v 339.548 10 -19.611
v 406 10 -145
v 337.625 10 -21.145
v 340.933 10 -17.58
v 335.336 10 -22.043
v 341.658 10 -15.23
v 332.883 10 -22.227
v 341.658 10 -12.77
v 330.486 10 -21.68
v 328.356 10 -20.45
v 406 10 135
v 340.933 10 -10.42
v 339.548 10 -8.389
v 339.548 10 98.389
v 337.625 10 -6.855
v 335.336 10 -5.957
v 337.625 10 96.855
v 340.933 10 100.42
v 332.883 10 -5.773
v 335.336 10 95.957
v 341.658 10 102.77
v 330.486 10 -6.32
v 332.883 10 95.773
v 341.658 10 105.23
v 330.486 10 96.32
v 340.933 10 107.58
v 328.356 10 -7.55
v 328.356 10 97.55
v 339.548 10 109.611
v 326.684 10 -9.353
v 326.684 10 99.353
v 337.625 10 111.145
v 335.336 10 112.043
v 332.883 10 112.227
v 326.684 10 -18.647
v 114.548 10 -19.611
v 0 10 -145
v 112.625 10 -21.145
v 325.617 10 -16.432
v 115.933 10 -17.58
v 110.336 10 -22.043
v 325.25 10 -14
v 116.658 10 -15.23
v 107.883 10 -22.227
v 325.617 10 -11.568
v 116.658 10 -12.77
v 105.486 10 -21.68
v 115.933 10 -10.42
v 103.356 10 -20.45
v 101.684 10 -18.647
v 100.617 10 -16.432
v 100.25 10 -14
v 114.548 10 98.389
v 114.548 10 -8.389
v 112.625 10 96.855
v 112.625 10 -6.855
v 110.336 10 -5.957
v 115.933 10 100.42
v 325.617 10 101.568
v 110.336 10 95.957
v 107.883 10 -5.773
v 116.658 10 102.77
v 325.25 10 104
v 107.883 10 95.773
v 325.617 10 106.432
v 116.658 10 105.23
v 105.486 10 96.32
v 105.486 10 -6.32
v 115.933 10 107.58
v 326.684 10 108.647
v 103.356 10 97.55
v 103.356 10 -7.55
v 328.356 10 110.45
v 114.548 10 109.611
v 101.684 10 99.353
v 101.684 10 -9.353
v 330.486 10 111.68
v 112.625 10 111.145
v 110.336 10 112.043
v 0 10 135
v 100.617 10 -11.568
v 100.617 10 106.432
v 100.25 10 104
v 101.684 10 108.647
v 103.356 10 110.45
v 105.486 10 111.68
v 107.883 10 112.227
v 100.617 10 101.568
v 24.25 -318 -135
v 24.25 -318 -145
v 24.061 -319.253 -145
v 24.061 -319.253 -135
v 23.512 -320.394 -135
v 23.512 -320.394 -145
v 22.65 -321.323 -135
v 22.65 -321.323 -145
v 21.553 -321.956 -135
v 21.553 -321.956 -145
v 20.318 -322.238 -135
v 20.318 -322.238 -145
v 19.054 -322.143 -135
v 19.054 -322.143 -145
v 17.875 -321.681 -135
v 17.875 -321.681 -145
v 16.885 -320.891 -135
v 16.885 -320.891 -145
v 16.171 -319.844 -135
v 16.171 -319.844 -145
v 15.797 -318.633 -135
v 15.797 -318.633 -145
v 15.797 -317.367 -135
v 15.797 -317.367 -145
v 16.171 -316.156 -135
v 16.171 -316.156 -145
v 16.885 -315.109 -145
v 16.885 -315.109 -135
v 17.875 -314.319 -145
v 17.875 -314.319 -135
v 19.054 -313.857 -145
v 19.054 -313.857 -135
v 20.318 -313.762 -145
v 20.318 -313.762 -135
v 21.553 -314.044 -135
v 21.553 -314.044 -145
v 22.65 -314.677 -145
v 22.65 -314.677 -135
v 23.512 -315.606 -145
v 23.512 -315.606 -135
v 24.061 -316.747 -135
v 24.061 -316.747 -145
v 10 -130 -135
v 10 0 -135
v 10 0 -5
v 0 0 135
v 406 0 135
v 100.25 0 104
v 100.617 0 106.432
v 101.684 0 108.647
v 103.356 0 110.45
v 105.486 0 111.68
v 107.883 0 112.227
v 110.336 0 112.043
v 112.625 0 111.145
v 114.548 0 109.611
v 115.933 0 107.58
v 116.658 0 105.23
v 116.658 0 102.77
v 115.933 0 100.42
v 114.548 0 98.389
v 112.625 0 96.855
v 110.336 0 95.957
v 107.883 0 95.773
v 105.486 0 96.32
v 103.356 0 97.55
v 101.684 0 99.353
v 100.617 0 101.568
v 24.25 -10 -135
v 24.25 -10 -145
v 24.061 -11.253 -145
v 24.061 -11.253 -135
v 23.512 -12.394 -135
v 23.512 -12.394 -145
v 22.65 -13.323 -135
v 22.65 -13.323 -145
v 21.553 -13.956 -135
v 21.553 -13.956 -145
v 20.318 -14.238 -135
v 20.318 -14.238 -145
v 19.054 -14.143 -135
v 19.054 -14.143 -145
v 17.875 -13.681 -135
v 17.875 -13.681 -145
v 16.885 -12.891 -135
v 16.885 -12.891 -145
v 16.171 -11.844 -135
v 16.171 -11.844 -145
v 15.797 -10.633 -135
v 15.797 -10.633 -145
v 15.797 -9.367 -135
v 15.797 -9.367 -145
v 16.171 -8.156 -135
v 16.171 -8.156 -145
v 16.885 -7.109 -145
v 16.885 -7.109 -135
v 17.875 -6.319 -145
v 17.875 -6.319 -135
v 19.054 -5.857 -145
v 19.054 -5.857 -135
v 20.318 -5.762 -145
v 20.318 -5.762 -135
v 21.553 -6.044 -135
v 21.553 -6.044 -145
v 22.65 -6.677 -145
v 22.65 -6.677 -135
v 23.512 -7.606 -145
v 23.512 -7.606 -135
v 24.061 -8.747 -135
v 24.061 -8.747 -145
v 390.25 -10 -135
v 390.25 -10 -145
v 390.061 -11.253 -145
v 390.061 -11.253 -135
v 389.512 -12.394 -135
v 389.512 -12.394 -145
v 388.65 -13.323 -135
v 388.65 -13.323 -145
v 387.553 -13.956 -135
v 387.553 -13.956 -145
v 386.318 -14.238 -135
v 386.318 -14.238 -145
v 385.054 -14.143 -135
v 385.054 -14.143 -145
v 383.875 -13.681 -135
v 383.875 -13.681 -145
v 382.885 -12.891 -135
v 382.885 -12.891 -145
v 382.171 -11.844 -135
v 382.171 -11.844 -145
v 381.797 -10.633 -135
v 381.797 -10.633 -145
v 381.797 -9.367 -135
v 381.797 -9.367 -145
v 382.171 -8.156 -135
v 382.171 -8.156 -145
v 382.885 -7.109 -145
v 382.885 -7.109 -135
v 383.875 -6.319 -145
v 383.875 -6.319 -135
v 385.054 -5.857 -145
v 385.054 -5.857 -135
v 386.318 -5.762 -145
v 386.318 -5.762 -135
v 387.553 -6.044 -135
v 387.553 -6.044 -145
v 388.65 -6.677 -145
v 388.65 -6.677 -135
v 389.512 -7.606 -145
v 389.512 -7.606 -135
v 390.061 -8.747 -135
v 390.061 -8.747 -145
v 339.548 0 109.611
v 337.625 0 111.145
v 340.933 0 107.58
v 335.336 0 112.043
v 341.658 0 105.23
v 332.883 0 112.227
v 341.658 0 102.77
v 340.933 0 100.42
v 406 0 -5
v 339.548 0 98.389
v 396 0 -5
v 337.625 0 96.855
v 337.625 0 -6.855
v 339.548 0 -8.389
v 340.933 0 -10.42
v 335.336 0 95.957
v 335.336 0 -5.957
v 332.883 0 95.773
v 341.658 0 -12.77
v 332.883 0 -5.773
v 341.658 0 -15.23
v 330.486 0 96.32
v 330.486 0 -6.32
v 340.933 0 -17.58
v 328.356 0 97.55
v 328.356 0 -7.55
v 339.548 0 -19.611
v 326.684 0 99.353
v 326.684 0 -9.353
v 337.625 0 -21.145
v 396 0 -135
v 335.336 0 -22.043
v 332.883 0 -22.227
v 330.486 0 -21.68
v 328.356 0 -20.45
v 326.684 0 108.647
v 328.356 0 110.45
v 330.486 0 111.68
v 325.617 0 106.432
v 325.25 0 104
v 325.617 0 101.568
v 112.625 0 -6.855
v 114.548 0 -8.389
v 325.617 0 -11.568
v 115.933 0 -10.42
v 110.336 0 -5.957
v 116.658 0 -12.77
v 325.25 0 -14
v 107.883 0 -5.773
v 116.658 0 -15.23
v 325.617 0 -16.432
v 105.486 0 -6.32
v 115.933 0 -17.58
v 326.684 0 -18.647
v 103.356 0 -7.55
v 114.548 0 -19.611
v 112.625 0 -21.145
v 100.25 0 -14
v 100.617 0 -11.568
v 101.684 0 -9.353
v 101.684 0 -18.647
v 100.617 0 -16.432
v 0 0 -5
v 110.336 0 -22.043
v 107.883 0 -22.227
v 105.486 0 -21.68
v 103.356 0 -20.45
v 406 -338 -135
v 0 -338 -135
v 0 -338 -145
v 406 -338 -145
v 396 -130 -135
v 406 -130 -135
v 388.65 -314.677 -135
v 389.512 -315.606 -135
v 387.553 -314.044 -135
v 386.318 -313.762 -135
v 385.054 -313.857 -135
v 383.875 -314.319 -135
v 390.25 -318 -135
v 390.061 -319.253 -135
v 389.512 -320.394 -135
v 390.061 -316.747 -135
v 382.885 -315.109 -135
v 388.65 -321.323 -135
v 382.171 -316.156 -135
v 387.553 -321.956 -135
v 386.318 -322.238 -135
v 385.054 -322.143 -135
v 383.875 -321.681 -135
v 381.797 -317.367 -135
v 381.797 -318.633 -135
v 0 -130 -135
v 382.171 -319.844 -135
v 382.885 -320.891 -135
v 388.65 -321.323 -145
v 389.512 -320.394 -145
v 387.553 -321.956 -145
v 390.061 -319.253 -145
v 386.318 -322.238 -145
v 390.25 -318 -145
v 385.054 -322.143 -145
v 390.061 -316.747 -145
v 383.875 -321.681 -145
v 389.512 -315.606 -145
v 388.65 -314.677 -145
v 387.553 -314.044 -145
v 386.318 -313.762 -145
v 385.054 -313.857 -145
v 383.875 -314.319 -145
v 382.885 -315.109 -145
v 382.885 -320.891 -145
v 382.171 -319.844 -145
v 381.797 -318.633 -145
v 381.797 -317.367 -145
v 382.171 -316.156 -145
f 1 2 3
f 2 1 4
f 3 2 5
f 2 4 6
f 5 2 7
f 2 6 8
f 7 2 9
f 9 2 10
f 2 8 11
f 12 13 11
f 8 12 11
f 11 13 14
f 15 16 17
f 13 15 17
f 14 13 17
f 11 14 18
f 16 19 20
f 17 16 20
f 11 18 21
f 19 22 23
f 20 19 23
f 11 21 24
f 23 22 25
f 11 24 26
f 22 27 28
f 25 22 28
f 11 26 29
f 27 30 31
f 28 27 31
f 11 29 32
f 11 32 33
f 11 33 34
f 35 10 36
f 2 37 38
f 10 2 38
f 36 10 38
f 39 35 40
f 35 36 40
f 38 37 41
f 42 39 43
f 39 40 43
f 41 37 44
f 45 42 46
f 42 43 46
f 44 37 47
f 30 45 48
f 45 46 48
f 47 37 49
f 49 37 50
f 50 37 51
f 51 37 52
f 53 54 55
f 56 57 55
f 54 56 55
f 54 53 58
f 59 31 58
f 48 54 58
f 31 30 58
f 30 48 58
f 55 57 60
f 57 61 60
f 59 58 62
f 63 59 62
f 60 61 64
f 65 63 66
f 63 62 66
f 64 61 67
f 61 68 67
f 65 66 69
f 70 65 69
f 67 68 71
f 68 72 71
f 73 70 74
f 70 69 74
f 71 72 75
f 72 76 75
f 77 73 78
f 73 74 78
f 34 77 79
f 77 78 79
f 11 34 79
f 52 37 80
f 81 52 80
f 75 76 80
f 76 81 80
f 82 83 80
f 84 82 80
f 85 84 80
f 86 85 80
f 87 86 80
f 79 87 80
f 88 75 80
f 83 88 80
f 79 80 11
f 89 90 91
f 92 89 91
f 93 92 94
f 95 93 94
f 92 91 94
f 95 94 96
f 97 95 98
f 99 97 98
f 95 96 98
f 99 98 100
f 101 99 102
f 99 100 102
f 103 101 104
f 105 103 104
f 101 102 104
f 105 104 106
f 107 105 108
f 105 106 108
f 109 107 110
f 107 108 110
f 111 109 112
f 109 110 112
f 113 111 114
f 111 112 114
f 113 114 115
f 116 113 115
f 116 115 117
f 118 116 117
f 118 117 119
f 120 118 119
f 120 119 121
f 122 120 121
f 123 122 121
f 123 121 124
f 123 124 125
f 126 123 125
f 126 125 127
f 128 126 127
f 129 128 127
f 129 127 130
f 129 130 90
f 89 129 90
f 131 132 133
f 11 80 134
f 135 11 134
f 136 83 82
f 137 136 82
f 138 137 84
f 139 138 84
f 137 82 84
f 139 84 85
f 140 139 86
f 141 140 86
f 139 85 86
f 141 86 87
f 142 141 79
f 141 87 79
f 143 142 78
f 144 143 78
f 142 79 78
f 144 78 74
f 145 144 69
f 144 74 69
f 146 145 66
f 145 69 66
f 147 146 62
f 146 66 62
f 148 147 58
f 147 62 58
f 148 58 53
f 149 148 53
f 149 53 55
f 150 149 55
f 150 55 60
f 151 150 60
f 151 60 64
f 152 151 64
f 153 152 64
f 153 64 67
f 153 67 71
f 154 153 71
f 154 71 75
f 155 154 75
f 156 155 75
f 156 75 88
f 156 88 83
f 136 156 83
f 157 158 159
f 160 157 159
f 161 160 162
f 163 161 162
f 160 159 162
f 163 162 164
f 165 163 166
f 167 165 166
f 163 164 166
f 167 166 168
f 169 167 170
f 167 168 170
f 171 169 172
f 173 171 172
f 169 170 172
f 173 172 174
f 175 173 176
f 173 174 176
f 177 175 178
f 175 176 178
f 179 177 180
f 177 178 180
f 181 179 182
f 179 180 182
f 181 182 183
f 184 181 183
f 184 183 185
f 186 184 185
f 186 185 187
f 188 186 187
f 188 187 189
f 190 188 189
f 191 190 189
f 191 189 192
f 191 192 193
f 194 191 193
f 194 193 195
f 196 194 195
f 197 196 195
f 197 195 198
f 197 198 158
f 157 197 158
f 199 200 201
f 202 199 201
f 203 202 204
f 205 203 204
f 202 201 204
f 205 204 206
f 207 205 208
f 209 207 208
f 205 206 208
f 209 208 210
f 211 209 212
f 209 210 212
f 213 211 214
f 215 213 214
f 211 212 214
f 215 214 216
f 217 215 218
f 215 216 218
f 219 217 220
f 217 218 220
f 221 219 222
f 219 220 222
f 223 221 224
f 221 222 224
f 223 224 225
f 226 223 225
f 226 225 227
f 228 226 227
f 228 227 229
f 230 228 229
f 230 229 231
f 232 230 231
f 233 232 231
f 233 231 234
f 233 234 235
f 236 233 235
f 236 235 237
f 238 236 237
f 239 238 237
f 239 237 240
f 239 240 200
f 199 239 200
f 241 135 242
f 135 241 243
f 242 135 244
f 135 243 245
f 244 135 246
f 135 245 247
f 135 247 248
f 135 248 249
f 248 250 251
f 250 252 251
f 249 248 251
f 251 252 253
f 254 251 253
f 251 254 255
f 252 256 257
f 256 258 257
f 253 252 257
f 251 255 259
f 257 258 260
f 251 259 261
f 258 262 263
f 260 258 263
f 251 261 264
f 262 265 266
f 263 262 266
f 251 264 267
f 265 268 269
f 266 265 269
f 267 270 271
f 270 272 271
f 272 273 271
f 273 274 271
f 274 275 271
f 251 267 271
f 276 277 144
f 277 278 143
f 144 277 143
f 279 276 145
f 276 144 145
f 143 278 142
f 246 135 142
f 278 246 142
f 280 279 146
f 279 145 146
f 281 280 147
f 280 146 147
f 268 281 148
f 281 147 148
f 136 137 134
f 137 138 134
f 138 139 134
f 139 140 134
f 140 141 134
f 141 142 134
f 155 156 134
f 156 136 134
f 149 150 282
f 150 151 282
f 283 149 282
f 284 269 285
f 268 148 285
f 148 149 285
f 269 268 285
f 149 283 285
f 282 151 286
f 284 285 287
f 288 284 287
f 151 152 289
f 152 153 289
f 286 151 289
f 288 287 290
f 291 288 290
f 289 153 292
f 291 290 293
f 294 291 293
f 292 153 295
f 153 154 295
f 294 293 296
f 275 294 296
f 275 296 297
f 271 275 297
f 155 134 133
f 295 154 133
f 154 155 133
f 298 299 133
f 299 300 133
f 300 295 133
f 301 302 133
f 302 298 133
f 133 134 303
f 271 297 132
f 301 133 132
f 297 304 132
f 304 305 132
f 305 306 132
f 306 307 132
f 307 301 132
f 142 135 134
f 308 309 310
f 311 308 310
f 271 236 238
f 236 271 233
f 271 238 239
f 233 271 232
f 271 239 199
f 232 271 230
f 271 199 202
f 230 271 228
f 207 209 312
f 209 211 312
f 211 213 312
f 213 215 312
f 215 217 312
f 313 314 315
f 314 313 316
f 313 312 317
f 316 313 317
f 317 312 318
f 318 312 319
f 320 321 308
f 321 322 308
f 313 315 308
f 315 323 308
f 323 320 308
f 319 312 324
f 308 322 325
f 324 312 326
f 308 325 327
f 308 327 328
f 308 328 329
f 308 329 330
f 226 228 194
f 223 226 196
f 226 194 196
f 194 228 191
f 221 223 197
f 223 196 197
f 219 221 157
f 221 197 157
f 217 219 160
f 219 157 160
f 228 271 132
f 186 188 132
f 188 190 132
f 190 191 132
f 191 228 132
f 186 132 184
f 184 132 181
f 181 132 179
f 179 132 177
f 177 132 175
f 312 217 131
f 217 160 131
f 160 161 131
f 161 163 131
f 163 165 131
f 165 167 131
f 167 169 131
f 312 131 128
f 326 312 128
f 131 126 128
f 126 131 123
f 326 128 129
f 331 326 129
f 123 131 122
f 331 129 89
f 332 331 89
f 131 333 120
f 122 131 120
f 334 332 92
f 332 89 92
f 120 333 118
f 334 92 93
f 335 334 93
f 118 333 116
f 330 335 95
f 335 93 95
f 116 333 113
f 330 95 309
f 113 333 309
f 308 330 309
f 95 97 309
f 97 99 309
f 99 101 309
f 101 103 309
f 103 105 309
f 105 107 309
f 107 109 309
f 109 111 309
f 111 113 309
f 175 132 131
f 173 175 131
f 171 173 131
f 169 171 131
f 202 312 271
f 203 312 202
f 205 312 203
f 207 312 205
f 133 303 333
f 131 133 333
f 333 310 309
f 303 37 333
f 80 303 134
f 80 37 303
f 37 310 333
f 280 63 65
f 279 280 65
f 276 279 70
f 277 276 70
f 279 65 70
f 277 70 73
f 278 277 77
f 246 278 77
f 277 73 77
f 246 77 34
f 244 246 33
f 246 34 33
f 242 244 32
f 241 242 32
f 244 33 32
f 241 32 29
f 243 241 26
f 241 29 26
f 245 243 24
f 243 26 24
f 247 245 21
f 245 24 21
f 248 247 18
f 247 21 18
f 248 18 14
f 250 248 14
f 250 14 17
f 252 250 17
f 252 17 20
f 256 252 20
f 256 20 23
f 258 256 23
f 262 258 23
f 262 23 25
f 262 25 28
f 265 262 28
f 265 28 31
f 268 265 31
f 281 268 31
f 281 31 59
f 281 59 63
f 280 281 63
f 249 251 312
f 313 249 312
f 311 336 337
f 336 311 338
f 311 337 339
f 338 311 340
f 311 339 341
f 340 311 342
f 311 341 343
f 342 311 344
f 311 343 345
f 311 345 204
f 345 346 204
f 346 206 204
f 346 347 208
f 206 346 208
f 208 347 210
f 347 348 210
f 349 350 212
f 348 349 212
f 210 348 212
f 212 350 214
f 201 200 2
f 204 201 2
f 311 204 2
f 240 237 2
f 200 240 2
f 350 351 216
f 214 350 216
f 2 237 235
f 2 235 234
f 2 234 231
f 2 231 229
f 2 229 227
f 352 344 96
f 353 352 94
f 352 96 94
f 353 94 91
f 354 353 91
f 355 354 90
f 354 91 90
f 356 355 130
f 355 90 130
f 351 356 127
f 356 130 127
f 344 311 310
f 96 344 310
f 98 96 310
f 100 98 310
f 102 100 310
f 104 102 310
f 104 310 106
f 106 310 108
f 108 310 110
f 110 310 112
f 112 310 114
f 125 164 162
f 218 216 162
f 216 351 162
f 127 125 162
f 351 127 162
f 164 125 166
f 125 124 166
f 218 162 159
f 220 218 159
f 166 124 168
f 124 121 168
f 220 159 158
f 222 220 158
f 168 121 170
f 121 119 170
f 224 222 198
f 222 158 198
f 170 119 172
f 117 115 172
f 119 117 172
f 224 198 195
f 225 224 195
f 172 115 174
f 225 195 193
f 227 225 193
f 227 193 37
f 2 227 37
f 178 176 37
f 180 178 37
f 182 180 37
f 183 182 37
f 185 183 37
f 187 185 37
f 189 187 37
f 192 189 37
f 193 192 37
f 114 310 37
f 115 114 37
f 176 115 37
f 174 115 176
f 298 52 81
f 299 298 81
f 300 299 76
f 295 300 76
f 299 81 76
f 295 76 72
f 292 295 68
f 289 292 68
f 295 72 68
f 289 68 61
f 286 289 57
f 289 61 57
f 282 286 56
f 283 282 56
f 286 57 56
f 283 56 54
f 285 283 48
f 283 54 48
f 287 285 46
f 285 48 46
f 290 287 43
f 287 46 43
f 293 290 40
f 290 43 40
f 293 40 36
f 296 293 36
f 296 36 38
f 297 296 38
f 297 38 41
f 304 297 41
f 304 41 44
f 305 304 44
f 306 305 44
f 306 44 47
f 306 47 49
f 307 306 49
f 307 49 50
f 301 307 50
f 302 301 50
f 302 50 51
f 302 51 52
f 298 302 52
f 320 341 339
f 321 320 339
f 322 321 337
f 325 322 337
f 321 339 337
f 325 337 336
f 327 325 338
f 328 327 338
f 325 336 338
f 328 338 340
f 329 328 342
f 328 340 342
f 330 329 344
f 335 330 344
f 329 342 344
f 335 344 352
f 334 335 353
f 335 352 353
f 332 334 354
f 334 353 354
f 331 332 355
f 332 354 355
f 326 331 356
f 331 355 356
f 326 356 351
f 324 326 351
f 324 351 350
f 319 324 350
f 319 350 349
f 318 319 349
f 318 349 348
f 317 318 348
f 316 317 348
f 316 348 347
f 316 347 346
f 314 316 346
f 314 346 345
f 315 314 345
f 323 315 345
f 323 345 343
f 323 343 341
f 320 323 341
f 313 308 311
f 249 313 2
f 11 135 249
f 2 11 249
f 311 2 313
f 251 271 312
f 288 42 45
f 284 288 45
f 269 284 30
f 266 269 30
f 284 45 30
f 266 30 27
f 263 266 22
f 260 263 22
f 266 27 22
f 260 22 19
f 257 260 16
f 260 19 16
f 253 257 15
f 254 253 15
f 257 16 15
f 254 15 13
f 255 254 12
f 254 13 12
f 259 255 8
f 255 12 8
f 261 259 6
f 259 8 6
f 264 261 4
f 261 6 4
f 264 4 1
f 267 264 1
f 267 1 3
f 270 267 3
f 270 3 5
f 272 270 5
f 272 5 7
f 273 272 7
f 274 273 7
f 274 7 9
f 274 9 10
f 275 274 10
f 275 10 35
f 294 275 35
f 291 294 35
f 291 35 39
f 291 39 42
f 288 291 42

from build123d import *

# Parameters (mm, degrees)
F1_DEPTH  = 406
F2_W      = 10
F2_H      = 130
F3_DEPTH  = 130
F6_DEPTH  = 406.001
F7_R      = 8.25
F8_DEPTH  = 348.001
F9_R      = 4.25
F10_DEPTH = 280.001


with BuildPart() as f1:
    # F0 (on Right) → F1 (new body)
    with BuildSketch(Plane.YZ):
        Polygon((10, 135), (0, 135), (0, -135), (-338, -135), (-338, -145), (10, -145), align=None)
    extrude(amount=F1_DEPTH)

    # F2 (on face) → F3 (join)
    with BuildSketch(Plane.XZ):
        with Locations((5, -70)):
            Rectangle(F2_W, F2_H)
        with Locations((401, -70)):
            Rectangle(F2_W, F2_H)
    extrude(amount=F3_DEPTH)

    # F5 (on face) + F4 (on face) → F6 (cut, through all)
    with BuildSketch(Plane(origin=(0, 0, 0), x_dir=(0, -1, 0), z_dir=(-1, 0, 0))):
        Polygon((130, -5), (0, -5), (130, -135), align=None)
    with BuildSketch(Plane.YZ.offset(406)):
        Polygon((-130, -135), (0, -5), (-130, -5), align=None)
    extrude(amount=-F6_DEPTH, mode=Mode.SUBTRACT)

    # F7 (on face) → F8 (cut, through all)
    with BuildSketch(Plane(origin=(0, 10, 0), x_dir=(-1, 0, 0), z_dir=(0, 1, 0))):
        with Locations((-333.5, 104)):
            Circle(F7_R)
        with Locations((-333.5, -14)):
            Circle(F7_R)
        with Locations((-108.5, -14)):
            Circle(F7_R)
        with Locations((-108.5, 104)):
            Circle(F7_R)
    extrude(amount=-F8_DEPTH, mode=Mode.SUBTRACT)

    # F9 (on face) → F10 (cut, through all)
    with BuildSketch(Plane(origin=(0, 0, -145), x_dir=(1, 0, 0), z_dir=(0, 0, -1))):
        with Locations((20, 318)):
            Circle(F9_R)
        with Locations((386, 318)):
            Circle(F9_R)
        with Locations((20, 10)):
            Circle(F9_R)
        with Locations((386, 10)):
            Circle(F9_R)
    extrude(amount=-F10_DEPTH, mode=Mode.SUBTRACT)


solid = f1.part
